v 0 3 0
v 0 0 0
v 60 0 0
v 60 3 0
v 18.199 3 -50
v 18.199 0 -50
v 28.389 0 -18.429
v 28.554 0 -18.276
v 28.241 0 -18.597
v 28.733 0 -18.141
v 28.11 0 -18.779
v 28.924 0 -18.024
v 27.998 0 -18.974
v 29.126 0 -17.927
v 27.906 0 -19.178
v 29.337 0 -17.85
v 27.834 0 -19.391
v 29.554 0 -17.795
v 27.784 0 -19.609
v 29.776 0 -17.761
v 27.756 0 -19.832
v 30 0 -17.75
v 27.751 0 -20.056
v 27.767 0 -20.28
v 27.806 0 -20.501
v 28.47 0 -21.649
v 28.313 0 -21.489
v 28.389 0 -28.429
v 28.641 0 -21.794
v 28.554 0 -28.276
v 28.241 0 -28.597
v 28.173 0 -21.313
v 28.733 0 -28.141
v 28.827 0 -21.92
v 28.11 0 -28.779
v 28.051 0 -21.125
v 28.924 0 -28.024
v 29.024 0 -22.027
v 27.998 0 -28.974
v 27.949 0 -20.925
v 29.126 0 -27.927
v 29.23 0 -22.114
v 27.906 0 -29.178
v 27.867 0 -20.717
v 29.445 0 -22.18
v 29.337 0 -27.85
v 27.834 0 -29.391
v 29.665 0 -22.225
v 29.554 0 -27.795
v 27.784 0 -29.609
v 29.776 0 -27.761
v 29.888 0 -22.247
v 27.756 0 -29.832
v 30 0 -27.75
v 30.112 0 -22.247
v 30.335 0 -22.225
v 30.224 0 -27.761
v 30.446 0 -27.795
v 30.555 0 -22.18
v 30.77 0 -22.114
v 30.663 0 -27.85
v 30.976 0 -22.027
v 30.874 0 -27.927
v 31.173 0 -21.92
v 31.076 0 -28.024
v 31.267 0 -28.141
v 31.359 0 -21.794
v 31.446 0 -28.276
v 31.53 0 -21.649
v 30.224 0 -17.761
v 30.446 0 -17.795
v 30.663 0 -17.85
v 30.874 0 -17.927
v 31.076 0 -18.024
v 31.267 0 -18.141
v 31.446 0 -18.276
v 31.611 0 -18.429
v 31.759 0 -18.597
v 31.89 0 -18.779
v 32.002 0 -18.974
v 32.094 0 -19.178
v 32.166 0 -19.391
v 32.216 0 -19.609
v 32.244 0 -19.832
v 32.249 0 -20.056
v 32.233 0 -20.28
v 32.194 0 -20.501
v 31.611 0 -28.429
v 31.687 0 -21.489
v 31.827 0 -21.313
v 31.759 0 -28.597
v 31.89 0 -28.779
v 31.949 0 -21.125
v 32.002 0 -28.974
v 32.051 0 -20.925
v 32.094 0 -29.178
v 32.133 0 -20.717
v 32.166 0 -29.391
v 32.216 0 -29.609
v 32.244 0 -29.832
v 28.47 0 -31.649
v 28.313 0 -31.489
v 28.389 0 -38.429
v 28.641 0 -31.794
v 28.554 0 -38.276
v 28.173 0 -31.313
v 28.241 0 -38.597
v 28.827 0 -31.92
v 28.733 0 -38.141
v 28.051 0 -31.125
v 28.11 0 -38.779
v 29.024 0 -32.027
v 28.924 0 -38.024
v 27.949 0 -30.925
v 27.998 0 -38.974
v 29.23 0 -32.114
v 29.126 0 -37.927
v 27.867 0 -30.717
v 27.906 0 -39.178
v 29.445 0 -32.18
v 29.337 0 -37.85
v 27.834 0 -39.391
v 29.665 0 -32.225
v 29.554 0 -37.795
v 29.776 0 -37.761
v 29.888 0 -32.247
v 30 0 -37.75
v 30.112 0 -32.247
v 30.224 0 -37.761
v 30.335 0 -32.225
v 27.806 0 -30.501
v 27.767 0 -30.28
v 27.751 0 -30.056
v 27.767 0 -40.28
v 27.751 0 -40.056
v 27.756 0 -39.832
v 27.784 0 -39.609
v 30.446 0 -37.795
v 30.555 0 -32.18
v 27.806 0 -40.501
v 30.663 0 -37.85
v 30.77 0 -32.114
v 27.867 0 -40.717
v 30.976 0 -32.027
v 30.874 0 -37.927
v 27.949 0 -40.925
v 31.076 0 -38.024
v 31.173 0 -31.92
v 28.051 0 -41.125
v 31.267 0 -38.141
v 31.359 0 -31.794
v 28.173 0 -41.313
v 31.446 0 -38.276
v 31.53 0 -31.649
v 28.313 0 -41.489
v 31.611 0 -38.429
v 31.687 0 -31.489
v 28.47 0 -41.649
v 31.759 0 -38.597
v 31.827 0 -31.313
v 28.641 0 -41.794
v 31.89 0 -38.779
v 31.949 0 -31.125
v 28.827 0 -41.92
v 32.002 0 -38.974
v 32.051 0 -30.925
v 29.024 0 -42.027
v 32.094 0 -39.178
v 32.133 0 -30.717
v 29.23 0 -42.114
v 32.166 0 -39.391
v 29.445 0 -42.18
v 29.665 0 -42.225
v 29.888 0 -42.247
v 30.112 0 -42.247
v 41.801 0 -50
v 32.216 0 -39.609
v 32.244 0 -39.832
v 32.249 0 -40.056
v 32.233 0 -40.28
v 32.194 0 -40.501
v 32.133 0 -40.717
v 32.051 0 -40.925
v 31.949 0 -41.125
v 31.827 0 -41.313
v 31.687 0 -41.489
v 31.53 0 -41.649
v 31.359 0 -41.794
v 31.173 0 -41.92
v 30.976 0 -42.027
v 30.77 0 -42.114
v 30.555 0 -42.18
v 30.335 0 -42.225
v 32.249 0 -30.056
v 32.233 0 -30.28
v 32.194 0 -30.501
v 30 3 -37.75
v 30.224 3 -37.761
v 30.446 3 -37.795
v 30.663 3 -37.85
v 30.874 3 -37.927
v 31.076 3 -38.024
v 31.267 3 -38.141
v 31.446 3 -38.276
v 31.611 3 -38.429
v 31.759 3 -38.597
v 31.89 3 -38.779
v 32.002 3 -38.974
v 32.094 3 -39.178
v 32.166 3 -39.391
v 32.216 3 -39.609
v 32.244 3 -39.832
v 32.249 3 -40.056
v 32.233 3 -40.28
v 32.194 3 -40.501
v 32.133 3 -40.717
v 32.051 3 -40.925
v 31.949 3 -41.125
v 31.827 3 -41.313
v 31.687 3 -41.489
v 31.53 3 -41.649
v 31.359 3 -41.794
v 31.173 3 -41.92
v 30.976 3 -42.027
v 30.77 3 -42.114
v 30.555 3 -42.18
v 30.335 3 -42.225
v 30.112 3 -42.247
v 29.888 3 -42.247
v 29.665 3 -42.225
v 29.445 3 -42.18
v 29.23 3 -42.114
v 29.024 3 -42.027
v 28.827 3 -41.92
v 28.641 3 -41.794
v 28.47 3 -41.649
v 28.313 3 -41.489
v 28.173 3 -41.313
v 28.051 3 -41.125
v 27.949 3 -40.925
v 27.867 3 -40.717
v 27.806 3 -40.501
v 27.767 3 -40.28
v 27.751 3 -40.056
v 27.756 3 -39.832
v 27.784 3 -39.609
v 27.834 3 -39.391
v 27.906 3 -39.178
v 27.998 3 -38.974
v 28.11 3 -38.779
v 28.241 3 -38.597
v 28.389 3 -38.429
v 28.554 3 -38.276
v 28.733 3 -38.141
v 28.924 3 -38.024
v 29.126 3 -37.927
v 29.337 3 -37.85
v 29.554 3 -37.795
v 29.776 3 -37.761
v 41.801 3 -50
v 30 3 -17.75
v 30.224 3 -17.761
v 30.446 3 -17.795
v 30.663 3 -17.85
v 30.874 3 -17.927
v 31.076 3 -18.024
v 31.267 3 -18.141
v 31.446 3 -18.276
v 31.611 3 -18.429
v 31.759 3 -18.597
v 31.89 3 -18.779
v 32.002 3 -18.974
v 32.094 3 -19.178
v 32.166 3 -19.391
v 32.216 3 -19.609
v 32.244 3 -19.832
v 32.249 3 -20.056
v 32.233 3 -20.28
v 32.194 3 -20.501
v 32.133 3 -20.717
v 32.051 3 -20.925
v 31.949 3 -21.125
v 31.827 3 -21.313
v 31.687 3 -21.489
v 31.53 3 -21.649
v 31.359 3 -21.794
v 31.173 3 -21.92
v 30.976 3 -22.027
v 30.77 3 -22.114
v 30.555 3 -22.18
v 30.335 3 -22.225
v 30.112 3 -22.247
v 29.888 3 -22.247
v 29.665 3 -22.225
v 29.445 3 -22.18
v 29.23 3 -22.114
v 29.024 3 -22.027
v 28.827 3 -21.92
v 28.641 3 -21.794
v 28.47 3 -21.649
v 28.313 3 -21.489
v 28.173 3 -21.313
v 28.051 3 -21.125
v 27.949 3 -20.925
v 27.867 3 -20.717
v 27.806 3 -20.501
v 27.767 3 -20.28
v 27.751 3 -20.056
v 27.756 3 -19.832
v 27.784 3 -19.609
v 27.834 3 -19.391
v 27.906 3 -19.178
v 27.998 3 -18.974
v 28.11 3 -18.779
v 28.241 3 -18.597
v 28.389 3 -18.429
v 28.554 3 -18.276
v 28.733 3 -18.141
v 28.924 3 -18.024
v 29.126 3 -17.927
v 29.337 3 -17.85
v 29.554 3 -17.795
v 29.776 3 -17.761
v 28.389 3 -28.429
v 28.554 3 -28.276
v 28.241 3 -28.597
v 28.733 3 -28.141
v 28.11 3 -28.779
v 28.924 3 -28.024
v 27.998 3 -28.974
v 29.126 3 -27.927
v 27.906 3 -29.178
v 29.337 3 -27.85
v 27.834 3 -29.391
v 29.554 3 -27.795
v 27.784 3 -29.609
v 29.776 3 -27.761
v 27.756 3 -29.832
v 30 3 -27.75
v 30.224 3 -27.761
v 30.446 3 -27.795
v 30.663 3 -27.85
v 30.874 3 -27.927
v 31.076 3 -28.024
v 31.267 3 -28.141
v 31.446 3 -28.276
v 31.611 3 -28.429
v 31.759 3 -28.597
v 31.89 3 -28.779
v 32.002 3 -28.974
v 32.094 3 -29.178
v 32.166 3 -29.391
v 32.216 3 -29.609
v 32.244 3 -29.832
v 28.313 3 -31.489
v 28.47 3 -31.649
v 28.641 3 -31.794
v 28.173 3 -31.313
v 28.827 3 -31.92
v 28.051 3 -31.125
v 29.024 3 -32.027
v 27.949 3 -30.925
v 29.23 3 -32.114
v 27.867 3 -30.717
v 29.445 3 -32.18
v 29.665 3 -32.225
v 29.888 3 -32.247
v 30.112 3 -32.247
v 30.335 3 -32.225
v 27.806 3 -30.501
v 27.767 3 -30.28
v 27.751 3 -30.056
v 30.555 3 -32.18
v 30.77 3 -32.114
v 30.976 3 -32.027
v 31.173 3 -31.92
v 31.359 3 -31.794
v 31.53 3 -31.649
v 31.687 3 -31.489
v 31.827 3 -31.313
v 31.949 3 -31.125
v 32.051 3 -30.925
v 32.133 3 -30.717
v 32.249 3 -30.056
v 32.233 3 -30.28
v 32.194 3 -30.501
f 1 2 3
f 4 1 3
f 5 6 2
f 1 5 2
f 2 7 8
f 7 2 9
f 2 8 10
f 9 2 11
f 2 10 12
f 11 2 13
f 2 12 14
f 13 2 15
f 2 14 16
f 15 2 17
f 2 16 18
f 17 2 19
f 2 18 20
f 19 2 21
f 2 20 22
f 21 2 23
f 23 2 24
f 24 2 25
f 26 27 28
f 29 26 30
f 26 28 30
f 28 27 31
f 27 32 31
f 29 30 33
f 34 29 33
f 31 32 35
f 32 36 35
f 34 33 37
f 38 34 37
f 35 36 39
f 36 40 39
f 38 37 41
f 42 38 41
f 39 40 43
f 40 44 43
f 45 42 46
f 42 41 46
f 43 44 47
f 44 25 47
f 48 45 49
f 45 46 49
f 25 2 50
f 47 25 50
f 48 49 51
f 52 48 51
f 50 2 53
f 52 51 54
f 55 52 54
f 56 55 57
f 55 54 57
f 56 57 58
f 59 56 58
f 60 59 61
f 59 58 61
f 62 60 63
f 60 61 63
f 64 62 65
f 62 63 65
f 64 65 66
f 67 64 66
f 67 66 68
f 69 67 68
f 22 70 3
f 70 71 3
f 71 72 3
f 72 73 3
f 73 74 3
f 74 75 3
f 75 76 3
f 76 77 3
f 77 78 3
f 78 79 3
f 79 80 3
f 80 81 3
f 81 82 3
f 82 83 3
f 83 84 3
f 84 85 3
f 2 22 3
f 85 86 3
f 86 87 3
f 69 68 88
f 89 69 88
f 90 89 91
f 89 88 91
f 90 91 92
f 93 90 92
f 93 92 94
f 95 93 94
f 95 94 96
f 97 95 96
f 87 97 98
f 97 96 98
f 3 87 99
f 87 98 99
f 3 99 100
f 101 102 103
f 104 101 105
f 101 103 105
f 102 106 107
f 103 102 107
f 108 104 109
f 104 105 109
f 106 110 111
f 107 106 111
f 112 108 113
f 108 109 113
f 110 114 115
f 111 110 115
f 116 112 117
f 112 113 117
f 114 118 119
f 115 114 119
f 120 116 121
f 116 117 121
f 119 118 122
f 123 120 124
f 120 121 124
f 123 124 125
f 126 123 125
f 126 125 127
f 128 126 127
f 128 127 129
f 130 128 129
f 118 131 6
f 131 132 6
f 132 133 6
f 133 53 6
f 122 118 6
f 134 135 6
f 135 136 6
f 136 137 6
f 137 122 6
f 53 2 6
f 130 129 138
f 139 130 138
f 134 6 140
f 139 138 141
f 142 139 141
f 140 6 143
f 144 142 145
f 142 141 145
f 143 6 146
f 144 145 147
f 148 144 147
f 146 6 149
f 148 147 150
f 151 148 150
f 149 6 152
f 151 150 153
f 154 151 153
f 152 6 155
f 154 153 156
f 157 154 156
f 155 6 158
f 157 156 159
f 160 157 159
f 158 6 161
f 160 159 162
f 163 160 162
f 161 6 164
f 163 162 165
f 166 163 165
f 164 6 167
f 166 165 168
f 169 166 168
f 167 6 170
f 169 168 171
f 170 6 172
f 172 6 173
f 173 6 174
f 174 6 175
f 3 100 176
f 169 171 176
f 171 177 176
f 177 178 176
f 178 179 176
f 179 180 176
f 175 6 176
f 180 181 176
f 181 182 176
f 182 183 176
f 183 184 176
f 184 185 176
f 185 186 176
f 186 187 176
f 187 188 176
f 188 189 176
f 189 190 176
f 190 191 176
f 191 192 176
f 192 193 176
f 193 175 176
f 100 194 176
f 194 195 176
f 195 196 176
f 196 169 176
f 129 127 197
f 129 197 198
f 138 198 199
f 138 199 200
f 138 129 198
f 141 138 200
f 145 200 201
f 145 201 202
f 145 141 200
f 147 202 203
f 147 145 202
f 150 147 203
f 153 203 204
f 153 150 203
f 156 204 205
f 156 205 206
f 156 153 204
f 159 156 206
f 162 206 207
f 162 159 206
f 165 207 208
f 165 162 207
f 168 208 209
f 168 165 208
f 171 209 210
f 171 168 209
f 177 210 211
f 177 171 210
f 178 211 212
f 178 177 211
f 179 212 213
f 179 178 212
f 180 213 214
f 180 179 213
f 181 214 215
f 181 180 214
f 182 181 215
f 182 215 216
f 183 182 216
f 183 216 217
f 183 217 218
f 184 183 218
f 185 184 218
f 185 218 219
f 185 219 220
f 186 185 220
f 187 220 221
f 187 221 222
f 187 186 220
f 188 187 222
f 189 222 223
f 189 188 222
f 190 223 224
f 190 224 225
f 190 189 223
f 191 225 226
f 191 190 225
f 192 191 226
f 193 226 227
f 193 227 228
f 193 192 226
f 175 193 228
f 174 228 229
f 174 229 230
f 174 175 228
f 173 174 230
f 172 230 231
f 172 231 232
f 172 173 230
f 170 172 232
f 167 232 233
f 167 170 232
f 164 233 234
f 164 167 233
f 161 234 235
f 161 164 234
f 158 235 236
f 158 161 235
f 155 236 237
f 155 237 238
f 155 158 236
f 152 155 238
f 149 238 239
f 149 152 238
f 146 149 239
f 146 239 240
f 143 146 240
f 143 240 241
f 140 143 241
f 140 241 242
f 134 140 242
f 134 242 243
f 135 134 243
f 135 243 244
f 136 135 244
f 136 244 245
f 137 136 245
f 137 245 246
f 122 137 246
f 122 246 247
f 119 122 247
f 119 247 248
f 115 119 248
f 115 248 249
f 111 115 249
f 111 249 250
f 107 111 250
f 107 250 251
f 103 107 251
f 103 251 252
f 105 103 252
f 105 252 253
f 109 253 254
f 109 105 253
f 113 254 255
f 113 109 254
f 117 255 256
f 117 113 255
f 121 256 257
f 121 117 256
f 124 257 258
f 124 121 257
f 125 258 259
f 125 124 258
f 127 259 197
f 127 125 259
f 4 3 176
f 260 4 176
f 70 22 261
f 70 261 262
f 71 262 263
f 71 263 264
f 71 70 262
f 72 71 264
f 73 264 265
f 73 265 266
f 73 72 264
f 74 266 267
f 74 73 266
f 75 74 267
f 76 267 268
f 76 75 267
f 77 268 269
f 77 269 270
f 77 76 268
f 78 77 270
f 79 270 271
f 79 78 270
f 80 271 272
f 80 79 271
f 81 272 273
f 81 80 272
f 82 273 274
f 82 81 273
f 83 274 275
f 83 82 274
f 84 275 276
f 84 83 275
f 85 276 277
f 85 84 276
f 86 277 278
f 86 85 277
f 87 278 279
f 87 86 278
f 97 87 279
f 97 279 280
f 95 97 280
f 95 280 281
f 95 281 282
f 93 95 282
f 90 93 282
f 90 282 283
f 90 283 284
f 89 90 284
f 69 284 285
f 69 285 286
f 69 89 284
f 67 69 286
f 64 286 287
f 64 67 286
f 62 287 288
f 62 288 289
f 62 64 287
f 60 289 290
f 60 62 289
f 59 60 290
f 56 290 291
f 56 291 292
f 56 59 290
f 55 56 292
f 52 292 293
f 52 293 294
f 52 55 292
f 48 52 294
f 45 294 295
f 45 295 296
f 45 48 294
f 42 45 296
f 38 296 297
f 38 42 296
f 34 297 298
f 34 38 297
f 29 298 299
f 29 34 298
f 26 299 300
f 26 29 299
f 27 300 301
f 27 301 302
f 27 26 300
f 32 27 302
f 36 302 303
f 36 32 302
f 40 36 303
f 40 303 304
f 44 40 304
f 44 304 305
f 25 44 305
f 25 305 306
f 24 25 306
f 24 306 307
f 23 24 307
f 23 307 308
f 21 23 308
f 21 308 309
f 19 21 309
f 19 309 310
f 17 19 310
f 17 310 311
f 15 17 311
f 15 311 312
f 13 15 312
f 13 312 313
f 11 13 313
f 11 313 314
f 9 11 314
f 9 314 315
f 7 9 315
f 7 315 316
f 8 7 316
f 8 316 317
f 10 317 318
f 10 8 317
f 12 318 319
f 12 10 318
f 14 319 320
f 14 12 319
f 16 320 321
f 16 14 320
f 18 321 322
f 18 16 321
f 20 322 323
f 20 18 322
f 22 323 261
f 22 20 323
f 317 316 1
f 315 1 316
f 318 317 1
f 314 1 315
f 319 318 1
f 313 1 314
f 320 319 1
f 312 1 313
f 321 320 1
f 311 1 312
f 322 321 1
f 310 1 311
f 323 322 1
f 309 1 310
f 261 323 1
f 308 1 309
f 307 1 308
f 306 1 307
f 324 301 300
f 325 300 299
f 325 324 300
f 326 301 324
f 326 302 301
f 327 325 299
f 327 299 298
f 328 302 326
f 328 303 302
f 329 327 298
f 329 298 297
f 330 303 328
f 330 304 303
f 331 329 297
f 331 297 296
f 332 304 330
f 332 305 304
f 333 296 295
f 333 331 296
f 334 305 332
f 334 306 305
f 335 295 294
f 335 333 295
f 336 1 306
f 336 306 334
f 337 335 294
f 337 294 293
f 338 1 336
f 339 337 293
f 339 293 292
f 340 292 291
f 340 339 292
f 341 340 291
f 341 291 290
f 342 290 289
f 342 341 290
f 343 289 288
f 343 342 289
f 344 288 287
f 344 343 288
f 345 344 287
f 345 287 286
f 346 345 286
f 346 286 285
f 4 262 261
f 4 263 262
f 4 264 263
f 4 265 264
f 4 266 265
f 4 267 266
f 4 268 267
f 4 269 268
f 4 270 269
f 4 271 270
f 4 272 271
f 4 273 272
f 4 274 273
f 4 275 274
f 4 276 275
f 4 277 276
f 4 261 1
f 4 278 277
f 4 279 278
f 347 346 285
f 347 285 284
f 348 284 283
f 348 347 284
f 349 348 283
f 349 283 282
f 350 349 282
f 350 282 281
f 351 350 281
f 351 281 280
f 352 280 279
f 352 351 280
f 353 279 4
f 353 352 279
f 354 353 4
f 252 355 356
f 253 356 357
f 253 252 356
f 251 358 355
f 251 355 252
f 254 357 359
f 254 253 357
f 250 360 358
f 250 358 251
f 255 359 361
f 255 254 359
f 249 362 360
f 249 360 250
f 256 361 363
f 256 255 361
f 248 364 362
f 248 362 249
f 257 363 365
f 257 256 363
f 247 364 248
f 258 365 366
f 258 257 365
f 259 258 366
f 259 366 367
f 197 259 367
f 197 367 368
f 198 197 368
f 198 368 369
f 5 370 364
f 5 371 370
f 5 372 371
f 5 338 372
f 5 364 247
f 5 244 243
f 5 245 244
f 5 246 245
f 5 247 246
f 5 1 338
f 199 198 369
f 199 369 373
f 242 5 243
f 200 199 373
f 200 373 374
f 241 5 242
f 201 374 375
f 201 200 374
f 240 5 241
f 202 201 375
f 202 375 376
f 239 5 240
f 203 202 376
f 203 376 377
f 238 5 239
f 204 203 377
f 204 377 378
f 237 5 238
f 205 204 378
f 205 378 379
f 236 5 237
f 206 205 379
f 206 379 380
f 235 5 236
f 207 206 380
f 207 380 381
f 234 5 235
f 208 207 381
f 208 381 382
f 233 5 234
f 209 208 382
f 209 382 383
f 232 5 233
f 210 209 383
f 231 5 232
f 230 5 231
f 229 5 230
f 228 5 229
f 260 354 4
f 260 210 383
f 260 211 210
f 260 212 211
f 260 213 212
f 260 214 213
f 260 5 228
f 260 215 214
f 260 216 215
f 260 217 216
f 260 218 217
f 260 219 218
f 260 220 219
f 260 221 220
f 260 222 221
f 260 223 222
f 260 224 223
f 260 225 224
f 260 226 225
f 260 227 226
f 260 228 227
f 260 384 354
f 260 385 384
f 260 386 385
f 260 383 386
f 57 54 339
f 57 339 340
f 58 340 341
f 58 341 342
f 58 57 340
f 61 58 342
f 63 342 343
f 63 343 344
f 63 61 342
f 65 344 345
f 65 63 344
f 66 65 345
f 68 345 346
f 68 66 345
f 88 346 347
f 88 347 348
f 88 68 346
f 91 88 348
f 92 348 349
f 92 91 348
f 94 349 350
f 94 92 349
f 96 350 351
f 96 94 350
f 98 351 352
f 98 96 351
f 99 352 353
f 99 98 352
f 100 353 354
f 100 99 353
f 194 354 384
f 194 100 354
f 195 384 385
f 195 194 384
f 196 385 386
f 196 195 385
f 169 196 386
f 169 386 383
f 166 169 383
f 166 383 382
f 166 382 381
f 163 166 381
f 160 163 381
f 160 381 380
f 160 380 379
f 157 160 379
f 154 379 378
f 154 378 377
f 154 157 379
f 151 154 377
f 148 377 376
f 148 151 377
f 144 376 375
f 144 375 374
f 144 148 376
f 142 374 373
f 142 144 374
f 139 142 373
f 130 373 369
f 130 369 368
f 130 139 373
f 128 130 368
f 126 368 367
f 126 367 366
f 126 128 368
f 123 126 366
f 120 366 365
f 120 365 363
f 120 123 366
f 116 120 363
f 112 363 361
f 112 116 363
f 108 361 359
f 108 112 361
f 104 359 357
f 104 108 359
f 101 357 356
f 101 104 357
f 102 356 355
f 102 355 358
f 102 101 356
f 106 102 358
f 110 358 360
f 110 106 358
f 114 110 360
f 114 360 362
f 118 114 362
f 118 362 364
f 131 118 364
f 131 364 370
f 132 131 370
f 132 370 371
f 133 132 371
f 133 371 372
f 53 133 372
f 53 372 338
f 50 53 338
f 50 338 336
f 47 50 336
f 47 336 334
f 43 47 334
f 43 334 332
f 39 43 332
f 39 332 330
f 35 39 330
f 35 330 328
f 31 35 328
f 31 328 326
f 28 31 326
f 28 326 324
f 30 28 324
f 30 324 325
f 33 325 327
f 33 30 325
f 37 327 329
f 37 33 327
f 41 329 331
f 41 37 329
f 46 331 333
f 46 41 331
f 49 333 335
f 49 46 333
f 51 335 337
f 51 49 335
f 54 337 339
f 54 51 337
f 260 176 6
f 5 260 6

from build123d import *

# Parameters (mm, degrees)
SKETCH_1_R      = 2.25
EXTRUDE_1_DEPTH = 3


with BuildPart() as part:
    # 草图1 → 凸台-拉伸1 (new body)
    with BuildSketch(Plane(origin=(0, 0, 0), x_dir=(1, 0, 0), z_dir=(0, 1, 0))):
        Polygon((0, 0), (60, 0), (41.801488287, 50), (18.198511713, 50), align=None)
        with Locations(Location((30, 30, 0), (0, 0, 270))):
            Circle(SKETCH_1_R, mode=Mode.SUBTRACT)
        with Locations(Location((30, 20, 0), (0, 0, 270))):
            Circle(SKETCH_1_R, mode=Mode.SUBTRACT)
        with Locations(Location((30, 40, 0), (0, 0, 270))):
            Circle(SKETCH_1_R, mode=Mode.SUBTRACT)
    extrude(amount=EXTRUDE_1_DEPTH)


solid = part.part
